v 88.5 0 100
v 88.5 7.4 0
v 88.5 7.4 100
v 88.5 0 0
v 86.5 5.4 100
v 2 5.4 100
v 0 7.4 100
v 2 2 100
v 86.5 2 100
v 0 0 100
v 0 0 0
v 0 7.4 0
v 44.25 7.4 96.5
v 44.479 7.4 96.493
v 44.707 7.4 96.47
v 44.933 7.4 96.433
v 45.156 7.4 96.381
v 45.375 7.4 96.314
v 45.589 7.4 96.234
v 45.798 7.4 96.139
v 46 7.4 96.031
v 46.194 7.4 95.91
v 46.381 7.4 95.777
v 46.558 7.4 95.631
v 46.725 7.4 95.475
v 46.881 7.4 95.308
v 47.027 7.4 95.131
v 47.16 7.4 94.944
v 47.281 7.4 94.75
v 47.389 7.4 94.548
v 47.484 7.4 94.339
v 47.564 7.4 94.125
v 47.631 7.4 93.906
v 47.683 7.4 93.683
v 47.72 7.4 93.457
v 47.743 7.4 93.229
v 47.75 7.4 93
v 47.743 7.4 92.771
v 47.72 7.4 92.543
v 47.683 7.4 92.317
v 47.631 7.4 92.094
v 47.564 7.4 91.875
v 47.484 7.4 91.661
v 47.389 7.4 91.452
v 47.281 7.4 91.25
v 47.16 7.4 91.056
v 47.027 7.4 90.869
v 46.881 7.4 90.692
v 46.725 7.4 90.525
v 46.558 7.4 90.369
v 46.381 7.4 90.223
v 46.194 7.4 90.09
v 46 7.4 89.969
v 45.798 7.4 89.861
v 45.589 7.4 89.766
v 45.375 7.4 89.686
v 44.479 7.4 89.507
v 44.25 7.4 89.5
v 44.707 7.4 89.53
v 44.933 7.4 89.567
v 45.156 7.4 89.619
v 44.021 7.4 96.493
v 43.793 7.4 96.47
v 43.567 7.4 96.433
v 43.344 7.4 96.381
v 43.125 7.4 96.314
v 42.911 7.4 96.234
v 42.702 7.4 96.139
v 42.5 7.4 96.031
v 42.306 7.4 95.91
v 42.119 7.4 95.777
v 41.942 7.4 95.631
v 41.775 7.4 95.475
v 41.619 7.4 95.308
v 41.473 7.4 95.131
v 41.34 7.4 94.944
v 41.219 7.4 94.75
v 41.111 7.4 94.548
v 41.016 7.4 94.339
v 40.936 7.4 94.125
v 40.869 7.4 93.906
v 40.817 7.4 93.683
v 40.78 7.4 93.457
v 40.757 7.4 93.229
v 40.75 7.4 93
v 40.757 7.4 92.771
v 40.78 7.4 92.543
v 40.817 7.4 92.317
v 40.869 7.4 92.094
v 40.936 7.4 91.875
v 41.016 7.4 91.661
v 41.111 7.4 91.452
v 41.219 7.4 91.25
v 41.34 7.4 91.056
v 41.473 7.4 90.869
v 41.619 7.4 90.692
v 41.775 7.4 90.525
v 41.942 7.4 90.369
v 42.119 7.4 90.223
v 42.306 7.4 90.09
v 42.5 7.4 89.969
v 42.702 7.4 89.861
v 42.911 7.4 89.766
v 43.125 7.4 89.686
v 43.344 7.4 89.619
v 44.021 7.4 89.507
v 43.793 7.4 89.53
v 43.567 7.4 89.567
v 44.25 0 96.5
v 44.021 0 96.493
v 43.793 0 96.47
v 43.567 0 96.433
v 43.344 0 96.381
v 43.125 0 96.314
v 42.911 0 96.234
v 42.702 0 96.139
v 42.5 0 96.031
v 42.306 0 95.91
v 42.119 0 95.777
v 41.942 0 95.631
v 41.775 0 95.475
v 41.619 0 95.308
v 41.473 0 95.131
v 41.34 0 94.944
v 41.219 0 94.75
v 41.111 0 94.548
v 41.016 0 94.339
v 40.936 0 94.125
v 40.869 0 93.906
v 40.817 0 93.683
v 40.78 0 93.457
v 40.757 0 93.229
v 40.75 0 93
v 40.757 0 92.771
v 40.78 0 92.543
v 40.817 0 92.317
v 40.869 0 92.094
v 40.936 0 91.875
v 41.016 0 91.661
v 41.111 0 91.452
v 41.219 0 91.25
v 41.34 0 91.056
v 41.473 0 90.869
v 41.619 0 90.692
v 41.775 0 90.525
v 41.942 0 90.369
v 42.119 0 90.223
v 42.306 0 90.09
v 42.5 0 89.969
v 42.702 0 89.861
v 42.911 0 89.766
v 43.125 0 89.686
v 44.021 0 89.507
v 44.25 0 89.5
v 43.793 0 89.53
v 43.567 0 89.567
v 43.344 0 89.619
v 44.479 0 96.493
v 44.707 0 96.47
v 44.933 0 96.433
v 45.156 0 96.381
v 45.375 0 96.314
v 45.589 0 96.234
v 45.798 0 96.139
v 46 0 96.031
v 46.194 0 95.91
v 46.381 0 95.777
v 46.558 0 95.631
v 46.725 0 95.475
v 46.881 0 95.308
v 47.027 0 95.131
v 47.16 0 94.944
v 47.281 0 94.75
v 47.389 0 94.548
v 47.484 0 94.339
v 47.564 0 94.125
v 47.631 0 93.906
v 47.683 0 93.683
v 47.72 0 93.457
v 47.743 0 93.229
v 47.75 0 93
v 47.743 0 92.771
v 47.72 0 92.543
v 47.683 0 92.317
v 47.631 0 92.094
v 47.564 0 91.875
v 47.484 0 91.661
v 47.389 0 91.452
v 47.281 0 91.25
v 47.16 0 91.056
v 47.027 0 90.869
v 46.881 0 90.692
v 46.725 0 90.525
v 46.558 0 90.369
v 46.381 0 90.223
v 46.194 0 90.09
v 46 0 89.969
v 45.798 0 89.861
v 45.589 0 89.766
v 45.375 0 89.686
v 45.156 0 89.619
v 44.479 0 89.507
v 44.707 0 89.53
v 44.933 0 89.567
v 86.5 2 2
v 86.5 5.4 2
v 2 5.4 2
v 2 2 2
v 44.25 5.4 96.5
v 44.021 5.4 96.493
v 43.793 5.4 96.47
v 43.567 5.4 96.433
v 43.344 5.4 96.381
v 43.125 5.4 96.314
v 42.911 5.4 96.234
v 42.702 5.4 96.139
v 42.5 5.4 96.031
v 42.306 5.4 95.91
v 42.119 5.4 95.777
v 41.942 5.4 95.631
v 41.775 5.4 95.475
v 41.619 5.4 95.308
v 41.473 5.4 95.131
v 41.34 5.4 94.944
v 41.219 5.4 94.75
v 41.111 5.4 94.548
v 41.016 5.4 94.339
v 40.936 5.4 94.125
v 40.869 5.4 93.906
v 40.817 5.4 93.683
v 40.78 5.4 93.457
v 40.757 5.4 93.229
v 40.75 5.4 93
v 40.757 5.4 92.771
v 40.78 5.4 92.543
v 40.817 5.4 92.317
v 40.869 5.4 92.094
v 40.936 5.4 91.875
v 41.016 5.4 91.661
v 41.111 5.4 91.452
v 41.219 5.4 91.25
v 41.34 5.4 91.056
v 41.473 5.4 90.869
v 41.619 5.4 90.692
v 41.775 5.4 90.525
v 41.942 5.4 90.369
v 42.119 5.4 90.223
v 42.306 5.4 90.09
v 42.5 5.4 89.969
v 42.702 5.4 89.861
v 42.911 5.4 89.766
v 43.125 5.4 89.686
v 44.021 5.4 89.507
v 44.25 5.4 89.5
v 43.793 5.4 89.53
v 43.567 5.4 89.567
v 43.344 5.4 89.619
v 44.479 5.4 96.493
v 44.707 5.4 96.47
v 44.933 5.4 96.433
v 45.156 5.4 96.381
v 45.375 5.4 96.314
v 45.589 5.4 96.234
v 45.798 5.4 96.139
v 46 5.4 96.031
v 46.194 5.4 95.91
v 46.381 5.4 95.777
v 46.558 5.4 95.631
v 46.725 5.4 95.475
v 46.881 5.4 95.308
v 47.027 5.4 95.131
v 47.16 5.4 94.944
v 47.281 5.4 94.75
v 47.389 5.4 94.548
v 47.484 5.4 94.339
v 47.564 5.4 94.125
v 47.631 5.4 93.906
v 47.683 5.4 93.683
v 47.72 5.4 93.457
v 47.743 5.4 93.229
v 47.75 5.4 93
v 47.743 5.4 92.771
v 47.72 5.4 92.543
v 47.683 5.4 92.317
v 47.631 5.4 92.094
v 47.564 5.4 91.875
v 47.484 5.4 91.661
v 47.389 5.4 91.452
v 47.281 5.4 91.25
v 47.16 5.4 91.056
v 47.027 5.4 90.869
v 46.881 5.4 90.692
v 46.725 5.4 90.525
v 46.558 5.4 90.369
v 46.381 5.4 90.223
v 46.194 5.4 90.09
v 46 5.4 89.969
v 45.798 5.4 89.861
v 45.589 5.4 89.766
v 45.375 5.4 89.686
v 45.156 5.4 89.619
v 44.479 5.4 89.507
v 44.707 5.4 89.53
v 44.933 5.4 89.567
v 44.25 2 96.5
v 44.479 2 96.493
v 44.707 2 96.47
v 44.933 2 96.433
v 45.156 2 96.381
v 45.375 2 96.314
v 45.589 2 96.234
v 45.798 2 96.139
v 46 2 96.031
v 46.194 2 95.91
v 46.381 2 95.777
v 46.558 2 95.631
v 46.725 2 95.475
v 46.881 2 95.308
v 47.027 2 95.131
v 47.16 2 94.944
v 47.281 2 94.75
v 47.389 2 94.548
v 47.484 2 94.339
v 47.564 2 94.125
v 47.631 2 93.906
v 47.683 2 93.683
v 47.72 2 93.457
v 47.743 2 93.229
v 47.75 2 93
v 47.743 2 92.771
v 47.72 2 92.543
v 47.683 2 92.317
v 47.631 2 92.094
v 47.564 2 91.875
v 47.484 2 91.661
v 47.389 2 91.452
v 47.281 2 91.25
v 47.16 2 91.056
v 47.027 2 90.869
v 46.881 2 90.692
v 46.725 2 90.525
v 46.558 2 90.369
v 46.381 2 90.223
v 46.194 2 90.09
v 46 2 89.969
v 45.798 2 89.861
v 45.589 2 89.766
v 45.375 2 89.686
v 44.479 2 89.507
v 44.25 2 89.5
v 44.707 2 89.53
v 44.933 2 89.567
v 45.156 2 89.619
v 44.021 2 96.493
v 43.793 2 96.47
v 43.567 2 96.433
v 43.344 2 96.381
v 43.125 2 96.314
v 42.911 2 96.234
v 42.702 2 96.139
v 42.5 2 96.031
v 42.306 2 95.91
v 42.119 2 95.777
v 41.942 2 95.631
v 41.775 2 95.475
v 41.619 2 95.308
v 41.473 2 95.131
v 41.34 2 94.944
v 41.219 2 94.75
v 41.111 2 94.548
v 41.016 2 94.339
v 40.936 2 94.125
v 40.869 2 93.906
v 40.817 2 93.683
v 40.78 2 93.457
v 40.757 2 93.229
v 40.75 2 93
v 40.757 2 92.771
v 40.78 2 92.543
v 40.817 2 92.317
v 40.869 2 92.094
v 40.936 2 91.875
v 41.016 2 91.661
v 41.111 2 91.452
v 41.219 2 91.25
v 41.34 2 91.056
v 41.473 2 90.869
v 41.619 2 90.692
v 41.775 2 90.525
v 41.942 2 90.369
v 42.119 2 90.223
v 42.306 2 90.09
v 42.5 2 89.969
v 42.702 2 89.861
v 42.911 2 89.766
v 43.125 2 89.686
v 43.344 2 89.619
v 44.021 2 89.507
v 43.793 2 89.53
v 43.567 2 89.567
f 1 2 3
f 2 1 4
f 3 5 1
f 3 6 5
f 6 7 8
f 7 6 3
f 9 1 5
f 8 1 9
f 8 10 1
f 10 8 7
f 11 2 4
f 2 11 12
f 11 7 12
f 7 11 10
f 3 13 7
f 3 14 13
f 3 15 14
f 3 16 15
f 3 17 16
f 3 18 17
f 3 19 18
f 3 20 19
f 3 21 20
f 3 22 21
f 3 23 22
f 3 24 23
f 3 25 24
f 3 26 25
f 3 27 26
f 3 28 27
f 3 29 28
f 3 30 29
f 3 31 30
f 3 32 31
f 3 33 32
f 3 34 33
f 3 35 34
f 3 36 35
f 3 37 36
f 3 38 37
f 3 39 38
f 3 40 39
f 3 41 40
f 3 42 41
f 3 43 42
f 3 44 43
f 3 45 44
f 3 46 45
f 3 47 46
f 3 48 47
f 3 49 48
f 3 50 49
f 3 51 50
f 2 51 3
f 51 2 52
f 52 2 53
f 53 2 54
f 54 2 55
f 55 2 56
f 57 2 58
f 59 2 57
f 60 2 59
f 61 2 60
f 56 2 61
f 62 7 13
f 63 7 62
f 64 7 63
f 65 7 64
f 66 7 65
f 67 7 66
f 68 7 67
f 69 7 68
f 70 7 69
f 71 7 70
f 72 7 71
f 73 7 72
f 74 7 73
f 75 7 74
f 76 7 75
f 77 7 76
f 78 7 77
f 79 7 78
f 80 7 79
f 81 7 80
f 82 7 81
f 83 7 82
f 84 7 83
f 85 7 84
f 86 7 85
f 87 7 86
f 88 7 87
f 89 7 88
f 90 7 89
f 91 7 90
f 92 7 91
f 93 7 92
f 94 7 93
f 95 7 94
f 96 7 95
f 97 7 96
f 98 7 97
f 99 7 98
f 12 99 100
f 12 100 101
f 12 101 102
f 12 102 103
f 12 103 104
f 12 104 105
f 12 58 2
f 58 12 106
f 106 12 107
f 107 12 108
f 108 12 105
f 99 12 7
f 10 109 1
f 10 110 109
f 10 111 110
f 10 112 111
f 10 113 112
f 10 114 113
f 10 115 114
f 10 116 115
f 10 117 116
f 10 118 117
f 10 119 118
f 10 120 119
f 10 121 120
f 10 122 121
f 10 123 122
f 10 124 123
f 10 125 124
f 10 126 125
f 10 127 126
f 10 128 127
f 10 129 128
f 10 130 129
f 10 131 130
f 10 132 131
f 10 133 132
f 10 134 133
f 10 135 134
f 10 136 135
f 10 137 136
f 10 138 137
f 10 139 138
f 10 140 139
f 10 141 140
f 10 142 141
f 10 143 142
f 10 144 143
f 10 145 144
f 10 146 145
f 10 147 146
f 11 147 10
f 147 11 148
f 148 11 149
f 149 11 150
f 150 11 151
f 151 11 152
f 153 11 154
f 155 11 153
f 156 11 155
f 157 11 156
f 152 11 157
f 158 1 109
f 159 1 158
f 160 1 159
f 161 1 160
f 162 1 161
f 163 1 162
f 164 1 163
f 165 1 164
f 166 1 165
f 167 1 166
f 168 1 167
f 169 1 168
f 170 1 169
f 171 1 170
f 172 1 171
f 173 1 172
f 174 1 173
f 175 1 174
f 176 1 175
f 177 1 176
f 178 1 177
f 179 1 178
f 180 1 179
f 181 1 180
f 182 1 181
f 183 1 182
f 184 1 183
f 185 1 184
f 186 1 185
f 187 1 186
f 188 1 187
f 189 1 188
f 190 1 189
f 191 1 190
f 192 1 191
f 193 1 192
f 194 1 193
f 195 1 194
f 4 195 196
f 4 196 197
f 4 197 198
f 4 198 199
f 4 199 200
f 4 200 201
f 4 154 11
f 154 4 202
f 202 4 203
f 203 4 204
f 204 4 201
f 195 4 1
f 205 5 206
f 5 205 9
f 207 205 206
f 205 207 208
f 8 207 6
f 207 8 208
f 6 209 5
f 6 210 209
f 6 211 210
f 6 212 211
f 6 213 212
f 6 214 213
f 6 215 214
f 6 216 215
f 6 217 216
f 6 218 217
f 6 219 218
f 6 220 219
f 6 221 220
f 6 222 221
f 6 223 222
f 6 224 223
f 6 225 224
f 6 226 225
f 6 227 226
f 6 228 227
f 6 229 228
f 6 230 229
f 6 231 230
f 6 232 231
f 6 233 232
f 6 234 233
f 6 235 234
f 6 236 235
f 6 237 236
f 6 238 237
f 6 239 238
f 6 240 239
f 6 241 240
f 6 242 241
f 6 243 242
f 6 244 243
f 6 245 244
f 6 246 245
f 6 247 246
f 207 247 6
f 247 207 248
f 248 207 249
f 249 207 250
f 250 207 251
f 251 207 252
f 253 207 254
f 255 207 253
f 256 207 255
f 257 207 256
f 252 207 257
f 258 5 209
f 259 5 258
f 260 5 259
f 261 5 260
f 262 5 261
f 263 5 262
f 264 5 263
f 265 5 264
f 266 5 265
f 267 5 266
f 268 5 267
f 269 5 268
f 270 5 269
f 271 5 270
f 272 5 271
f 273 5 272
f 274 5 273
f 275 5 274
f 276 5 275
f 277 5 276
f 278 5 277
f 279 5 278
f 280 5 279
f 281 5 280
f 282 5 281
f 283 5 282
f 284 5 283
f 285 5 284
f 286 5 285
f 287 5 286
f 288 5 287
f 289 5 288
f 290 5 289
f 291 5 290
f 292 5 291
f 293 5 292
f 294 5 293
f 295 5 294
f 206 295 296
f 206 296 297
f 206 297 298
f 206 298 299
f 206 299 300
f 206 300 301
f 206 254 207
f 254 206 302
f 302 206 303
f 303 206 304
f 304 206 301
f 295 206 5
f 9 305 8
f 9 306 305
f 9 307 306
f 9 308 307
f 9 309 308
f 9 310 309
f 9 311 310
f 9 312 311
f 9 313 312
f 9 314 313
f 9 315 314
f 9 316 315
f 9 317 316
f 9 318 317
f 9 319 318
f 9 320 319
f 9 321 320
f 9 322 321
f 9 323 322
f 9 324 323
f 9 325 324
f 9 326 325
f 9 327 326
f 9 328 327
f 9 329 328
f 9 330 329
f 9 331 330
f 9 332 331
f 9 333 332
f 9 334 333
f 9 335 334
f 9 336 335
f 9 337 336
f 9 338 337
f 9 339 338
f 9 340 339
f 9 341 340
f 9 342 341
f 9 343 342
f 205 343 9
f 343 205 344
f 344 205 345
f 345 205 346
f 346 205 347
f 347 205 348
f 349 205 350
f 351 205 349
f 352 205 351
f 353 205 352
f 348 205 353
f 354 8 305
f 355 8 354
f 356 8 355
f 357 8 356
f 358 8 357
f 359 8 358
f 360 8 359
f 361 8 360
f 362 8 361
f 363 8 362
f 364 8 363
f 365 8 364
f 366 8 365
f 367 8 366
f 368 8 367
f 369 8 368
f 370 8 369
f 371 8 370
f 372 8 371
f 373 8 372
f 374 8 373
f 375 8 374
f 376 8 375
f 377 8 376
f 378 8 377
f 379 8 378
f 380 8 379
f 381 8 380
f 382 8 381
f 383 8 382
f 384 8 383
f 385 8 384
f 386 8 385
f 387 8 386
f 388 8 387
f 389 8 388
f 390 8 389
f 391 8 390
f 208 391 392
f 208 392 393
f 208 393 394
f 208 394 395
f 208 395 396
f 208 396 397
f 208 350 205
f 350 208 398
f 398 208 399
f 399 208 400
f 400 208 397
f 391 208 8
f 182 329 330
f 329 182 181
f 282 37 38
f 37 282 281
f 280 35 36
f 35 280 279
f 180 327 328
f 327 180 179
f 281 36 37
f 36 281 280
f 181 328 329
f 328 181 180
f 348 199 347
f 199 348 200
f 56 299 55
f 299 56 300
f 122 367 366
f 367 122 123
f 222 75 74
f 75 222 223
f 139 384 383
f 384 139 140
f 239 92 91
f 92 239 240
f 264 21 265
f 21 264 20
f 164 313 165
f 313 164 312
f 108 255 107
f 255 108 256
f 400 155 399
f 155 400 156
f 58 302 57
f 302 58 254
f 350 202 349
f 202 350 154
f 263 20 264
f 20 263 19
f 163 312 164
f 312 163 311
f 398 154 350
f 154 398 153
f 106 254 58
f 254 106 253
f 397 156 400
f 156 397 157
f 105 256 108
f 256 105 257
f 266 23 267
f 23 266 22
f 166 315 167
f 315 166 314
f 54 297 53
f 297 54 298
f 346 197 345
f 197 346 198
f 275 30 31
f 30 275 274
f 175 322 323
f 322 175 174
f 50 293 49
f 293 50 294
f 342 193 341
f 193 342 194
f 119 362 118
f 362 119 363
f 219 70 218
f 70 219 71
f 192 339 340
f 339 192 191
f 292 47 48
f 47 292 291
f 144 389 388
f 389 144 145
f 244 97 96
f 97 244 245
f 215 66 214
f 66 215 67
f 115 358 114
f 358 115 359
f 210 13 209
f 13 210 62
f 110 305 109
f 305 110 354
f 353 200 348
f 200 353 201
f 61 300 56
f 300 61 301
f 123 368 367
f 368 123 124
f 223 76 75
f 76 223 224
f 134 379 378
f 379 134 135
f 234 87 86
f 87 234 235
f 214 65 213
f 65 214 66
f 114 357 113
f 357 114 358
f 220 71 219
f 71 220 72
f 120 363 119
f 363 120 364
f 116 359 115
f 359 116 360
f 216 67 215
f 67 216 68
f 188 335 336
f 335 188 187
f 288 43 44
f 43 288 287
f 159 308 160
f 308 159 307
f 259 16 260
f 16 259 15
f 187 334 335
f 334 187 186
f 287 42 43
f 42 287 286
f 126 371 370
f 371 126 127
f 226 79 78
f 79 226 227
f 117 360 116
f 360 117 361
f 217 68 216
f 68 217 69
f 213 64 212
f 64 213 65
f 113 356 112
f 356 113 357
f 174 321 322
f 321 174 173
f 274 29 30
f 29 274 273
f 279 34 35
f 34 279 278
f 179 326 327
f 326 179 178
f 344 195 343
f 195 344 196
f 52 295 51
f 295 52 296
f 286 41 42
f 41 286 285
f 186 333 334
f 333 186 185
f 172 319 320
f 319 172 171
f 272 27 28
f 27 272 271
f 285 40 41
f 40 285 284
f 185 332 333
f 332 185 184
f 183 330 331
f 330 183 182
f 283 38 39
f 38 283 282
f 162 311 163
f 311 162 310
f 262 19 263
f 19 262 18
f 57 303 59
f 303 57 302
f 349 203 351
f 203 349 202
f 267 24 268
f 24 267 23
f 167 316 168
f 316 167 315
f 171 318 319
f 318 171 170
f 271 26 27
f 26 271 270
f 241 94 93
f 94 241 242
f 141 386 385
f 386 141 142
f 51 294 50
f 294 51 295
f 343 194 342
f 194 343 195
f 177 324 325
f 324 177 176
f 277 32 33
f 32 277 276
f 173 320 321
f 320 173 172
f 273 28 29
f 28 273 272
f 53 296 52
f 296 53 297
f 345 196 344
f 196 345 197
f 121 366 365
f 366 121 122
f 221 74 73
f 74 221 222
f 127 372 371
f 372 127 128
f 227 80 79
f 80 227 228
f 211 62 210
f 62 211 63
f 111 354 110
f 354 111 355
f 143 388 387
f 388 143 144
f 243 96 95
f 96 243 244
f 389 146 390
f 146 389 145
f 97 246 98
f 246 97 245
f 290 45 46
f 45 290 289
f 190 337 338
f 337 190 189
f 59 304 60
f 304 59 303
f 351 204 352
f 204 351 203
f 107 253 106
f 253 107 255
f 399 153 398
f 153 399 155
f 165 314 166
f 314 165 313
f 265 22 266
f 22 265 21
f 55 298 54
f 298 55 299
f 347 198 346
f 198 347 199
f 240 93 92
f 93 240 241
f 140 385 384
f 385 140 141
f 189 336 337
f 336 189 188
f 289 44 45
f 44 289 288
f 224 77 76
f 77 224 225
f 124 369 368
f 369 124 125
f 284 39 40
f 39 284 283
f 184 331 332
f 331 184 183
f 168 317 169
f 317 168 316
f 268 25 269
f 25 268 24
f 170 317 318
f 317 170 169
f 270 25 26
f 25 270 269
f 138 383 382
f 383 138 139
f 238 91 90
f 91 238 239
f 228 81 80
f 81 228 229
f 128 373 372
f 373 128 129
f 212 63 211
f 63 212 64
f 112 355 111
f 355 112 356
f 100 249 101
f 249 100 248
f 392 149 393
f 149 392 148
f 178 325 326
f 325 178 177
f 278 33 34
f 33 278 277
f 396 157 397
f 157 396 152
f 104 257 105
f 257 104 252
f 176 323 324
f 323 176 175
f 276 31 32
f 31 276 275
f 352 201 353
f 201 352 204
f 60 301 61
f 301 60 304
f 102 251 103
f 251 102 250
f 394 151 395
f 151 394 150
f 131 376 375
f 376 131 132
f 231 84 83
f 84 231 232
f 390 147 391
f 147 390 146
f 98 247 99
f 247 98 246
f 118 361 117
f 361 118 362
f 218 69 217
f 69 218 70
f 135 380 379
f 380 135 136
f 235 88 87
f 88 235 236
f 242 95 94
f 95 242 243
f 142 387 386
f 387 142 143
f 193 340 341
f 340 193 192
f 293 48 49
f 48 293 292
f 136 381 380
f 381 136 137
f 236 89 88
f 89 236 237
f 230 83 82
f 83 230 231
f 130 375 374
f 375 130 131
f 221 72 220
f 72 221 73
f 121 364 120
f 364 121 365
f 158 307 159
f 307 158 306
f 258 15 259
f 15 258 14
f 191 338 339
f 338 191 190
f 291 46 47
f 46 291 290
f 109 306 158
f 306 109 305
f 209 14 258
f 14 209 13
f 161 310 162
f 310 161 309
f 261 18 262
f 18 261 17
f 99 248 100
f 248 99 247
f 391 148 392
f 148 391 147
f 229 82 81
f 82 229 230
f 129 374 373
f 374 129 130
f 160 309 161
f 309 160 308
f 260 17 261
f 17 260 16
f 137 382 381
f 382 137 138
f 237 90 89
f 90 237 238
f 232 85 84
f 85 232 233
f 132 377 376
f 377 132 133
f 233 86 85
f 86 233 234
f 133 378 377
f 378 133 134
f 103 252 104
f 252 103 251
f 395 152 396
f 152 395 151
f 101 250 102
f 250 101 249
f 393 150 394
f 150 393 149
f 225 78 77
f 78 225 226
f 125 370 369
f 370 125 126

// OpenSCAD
//
// QR SafeShare - Clean Lockable QR Sleeve (83x83x2.35mm)
// 7.0 mm lock hole + 14 mm top margin for extra strength
//
// HOW TO USE (OpenSCAD):
// 1) Open in OpenSCAD.
// 2) Render (F6).
// 3) Export STL (F7).
//

// ---------------- Parameters ----------------
qr_size        = 84;     // QR tile width/height (mm)
qr_thickness   = 2.9;   // QR tile thickness (mm)
wall           = 2.0;    // wall thickness (mm)
clearance      = 0.5;    // clearance (mm)
floor_thick    = 2.0;    // bottom thickness (mm)
height_margin  = 14.0;   // free space above QR (mm) for lock zone
lock_hole_d    = 7.0;    // diameter of lock hole (mm)
// --------------------------------------------

// Derived dimensions
inner_w = qr_size + clearance;
inner_d = qr_thickness + clearance;
outer_w = inner_w + 2*wall;
outer_d = inner_d + 2*wall;
qr_top  = floor_thick + qr_size;
outer_h = qr_top + height_margin;

// Sleeve body (open-top box with centered lock hole through front/back walls)
difference(){
    // Outer shell
    cube([outer_w, outer_d, outer_h], center=false);
    // Inner cavity
    translate([wall, wall, floor_thick])
        cube([inner_w, inner_d, qr_size + height_margin + 0.2], center=false);
    // Lock hole (centered in the margin above the QR)
    translate([outer_w/2, outer_d/2, outer_h - height_margin/2])
        rotate([90,0,0])
            cylinder(d=lock_hole_d, h=outer_d, center=true, $fn=96);
}
